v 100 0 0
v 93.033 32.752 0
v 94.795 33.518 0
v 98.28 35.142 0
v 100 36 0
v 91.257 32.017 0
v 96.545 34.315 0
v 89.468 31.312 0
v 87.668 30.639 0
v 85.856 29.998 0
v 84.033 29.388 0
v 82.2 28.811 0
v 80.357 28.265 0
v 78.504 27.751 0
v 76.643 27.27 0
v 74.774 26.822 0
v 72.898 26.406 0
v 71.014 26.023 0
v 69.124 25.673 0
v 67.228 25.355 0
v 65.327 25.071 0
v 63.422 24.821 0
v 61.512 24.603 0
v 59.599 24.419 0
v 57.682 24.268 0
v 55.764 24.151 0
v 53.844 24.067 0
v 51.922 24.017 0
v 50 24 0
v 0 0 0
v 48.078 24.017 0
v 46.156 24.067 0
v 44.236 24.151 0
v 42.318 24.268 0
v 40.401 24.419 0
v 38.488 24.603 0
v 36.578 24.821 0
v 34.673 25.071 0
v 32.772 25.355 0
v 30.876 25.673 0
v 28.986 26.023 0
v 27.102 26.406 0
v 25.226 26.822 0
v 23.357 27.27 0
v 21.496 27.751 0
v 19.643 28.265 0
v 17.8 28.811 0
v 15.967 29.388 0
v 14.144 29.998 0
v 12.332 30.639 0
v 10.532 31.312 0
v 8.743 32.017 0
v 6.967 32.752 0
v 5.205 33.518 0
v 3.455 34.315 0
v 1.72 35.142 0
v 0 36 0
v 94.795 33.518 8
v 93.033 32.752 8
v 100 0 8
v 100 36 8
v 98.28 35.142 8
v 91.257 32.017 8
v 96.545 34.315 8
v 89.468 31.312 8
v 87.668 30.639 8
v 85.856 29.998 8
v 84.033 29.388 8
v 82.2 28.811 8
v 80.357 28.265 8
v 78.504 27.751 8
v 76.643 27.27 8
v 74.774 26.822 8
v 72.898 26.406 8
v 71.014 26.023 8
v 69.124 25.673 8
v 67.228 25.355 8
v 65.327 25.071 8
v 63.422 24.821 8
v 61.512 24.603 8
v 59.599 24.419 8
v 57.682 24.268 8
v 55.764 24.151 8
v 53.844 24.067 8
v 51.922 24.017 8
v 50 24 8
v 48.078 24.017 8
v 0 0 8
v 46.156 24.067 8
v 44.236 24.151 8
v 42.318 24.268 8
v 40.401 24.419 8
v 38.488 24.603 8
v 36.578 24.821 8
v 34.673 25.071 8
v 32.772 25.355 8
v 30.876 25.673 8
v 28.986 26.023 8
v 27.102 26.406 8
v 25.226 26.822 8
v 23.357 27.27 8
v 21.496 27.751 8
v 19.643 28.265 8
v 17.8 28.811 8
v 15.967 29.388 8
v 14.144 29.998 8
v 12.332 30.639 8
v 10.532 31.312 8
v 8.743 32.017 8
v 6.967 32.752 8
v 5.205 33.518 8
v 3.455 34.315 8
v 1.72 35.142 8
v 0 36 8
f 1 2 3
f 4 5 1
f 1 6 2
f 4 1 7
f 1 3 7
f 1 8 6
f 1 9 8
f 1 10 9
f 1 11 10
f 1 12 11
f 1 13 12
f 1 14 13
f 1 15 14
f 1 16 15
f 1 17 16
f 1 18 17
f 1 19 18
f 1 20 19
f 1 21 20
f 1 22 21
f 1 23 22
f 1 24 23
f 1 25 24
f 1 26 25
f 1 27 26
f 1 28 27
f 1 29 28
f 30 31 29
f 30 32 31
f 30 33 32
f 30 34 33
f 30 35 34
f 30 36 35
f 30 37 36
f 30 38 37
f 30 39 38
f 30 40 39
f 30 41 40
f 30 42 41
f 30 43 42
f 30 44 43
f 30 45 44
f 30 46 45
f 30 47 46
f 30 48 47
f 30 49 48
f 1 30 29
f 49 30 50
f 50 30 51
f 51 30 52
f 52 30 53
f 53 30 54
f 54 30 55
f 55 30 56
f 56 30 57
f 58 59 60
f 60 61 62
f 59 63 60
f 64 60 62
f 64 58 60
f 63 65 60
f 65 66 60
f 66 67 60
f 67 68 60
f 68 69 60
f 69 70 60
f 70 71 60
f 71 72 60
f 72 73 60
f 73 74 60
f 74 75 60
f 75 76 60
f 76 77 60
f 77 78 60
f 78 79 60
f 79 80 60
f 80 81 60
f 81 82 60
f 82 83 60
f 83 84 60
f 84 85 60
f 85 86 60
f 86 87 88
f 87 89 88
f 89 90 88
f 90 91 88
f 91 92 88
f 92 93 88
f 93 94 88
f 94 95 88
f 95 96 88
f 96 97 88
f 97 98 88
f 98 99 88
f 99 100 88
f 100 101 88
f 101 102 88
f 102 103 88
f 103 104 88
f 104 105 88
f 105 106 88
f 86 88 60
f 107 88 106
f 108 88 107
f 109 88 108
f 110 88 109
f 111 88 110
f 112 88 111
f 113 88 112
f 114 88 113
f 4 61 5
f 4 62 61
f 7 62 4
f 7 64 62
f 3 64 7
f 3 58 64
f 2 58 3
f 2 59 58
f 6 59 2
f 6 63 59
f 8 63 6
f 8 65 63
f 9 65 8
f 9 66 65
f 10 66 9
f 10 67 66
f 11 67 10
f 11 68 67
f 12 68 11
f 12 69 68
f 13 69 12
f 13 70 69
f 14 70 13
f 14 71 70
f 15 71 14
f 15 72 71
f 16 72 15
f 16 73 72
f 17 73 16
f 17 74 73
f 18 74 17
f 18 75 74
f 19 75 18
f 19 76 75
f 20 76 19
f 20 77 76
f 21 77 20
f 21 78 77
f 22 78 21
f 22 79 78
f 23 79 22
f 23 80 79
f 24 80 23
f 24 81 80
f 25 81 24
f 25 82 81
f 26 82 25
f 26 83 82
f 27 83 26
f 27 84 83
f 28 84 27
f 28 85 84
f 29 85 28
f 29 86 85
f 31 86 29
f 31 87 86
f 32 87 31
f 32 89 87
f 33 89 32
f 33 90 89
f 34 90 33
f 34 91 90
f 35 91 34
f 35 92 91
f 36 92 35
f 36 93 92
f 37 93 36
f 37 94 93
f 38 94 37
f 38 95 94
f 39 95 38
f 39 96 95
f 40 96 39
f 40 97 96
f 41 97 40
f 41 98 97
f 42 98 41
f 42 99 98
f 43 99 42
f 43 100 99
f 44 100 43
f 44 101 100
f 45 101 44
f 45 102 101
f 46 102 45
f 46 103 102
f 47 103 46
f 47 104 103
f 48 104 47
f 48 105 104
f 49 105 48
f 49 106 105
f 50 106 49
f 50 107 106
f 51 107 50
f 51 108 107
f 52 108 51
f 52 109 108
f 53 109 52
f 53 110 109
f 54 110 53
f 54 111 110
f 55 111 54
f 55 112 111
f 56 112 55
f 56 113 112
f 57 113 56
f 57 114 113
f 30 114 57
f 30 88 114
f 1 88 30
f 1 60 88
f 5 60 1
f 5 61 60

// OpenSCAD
$fn = 32;

// ----------------------------------------------------------------------
// Arc profile plate: notch, 57 points
// ----------------------------------------------------------------------

// --- parameters (mm) ---
bar_l = 100;              // bar length, X
bar_w = 36;               // bar width, Y
notch_depth = 12;         // depth of the arc notch at mid-span
arc_r = 110.17;           // radius of the notch arc
arc_angle = 53.98;        // notch arc angle, degrees
arc_step = 1;             // sampling step of the notch arc, degrees
plate_t = 8;              // plate thickness, Z

profile = [[0, 0], [100, 0], [100, 36], [98.28, 35.142], [96.545, 34.315], [94.795, 33.518], [93.033, 32.752], [91.257, 32.017], [89.468, 31.312], [87.668, 30.639], [85.856, 29.998], [84.033, 29.388], [82.2, 28.811], [80.357, 28.265], [78.504, 27.751], [76.643, 27.27], [74.774, 26.822], [72.898, 26.406], [71.014, 26.023], [69.124, 25.673], [67.228, 25.355], [65.327, 25.071], [63.422, 24.821], [61.512, 24.603], [59.599, 24.419], [57.682, 24.268], [55.764, 24.151], [53.844, 24.067], [51.922, 24.017], [50, 24], [48.078, 24.017], [46.156, 24.067], [44.236, 24.151], [42.318, 24.268], [40.401, 24.419], [38.488, 24.603], [36.578, 24.821], [34.673, 25.071], [32.772, 25.355], [30.876, 25.673], [28.986, 26.023], [27.102, 26.406], [25.226, 26.822], [23.357, 27.27], [21.496, 27.751], [19.643, 28.265], [17.8, 28.811], [15.967, 29.388], [14.144, 29.998], [12.332, 30.639], [10.532, 31.312], [8.743, 32.017], [6.967, 32.752], [5.205, 33.518], [3.455, 34.315], [1.72, 35.142], [0, 36]];  // primary outline, 57 points, counter clockwise

// --- the one profile operation ---
linear_extrude(height = plate_t) polygon(points = profile);
